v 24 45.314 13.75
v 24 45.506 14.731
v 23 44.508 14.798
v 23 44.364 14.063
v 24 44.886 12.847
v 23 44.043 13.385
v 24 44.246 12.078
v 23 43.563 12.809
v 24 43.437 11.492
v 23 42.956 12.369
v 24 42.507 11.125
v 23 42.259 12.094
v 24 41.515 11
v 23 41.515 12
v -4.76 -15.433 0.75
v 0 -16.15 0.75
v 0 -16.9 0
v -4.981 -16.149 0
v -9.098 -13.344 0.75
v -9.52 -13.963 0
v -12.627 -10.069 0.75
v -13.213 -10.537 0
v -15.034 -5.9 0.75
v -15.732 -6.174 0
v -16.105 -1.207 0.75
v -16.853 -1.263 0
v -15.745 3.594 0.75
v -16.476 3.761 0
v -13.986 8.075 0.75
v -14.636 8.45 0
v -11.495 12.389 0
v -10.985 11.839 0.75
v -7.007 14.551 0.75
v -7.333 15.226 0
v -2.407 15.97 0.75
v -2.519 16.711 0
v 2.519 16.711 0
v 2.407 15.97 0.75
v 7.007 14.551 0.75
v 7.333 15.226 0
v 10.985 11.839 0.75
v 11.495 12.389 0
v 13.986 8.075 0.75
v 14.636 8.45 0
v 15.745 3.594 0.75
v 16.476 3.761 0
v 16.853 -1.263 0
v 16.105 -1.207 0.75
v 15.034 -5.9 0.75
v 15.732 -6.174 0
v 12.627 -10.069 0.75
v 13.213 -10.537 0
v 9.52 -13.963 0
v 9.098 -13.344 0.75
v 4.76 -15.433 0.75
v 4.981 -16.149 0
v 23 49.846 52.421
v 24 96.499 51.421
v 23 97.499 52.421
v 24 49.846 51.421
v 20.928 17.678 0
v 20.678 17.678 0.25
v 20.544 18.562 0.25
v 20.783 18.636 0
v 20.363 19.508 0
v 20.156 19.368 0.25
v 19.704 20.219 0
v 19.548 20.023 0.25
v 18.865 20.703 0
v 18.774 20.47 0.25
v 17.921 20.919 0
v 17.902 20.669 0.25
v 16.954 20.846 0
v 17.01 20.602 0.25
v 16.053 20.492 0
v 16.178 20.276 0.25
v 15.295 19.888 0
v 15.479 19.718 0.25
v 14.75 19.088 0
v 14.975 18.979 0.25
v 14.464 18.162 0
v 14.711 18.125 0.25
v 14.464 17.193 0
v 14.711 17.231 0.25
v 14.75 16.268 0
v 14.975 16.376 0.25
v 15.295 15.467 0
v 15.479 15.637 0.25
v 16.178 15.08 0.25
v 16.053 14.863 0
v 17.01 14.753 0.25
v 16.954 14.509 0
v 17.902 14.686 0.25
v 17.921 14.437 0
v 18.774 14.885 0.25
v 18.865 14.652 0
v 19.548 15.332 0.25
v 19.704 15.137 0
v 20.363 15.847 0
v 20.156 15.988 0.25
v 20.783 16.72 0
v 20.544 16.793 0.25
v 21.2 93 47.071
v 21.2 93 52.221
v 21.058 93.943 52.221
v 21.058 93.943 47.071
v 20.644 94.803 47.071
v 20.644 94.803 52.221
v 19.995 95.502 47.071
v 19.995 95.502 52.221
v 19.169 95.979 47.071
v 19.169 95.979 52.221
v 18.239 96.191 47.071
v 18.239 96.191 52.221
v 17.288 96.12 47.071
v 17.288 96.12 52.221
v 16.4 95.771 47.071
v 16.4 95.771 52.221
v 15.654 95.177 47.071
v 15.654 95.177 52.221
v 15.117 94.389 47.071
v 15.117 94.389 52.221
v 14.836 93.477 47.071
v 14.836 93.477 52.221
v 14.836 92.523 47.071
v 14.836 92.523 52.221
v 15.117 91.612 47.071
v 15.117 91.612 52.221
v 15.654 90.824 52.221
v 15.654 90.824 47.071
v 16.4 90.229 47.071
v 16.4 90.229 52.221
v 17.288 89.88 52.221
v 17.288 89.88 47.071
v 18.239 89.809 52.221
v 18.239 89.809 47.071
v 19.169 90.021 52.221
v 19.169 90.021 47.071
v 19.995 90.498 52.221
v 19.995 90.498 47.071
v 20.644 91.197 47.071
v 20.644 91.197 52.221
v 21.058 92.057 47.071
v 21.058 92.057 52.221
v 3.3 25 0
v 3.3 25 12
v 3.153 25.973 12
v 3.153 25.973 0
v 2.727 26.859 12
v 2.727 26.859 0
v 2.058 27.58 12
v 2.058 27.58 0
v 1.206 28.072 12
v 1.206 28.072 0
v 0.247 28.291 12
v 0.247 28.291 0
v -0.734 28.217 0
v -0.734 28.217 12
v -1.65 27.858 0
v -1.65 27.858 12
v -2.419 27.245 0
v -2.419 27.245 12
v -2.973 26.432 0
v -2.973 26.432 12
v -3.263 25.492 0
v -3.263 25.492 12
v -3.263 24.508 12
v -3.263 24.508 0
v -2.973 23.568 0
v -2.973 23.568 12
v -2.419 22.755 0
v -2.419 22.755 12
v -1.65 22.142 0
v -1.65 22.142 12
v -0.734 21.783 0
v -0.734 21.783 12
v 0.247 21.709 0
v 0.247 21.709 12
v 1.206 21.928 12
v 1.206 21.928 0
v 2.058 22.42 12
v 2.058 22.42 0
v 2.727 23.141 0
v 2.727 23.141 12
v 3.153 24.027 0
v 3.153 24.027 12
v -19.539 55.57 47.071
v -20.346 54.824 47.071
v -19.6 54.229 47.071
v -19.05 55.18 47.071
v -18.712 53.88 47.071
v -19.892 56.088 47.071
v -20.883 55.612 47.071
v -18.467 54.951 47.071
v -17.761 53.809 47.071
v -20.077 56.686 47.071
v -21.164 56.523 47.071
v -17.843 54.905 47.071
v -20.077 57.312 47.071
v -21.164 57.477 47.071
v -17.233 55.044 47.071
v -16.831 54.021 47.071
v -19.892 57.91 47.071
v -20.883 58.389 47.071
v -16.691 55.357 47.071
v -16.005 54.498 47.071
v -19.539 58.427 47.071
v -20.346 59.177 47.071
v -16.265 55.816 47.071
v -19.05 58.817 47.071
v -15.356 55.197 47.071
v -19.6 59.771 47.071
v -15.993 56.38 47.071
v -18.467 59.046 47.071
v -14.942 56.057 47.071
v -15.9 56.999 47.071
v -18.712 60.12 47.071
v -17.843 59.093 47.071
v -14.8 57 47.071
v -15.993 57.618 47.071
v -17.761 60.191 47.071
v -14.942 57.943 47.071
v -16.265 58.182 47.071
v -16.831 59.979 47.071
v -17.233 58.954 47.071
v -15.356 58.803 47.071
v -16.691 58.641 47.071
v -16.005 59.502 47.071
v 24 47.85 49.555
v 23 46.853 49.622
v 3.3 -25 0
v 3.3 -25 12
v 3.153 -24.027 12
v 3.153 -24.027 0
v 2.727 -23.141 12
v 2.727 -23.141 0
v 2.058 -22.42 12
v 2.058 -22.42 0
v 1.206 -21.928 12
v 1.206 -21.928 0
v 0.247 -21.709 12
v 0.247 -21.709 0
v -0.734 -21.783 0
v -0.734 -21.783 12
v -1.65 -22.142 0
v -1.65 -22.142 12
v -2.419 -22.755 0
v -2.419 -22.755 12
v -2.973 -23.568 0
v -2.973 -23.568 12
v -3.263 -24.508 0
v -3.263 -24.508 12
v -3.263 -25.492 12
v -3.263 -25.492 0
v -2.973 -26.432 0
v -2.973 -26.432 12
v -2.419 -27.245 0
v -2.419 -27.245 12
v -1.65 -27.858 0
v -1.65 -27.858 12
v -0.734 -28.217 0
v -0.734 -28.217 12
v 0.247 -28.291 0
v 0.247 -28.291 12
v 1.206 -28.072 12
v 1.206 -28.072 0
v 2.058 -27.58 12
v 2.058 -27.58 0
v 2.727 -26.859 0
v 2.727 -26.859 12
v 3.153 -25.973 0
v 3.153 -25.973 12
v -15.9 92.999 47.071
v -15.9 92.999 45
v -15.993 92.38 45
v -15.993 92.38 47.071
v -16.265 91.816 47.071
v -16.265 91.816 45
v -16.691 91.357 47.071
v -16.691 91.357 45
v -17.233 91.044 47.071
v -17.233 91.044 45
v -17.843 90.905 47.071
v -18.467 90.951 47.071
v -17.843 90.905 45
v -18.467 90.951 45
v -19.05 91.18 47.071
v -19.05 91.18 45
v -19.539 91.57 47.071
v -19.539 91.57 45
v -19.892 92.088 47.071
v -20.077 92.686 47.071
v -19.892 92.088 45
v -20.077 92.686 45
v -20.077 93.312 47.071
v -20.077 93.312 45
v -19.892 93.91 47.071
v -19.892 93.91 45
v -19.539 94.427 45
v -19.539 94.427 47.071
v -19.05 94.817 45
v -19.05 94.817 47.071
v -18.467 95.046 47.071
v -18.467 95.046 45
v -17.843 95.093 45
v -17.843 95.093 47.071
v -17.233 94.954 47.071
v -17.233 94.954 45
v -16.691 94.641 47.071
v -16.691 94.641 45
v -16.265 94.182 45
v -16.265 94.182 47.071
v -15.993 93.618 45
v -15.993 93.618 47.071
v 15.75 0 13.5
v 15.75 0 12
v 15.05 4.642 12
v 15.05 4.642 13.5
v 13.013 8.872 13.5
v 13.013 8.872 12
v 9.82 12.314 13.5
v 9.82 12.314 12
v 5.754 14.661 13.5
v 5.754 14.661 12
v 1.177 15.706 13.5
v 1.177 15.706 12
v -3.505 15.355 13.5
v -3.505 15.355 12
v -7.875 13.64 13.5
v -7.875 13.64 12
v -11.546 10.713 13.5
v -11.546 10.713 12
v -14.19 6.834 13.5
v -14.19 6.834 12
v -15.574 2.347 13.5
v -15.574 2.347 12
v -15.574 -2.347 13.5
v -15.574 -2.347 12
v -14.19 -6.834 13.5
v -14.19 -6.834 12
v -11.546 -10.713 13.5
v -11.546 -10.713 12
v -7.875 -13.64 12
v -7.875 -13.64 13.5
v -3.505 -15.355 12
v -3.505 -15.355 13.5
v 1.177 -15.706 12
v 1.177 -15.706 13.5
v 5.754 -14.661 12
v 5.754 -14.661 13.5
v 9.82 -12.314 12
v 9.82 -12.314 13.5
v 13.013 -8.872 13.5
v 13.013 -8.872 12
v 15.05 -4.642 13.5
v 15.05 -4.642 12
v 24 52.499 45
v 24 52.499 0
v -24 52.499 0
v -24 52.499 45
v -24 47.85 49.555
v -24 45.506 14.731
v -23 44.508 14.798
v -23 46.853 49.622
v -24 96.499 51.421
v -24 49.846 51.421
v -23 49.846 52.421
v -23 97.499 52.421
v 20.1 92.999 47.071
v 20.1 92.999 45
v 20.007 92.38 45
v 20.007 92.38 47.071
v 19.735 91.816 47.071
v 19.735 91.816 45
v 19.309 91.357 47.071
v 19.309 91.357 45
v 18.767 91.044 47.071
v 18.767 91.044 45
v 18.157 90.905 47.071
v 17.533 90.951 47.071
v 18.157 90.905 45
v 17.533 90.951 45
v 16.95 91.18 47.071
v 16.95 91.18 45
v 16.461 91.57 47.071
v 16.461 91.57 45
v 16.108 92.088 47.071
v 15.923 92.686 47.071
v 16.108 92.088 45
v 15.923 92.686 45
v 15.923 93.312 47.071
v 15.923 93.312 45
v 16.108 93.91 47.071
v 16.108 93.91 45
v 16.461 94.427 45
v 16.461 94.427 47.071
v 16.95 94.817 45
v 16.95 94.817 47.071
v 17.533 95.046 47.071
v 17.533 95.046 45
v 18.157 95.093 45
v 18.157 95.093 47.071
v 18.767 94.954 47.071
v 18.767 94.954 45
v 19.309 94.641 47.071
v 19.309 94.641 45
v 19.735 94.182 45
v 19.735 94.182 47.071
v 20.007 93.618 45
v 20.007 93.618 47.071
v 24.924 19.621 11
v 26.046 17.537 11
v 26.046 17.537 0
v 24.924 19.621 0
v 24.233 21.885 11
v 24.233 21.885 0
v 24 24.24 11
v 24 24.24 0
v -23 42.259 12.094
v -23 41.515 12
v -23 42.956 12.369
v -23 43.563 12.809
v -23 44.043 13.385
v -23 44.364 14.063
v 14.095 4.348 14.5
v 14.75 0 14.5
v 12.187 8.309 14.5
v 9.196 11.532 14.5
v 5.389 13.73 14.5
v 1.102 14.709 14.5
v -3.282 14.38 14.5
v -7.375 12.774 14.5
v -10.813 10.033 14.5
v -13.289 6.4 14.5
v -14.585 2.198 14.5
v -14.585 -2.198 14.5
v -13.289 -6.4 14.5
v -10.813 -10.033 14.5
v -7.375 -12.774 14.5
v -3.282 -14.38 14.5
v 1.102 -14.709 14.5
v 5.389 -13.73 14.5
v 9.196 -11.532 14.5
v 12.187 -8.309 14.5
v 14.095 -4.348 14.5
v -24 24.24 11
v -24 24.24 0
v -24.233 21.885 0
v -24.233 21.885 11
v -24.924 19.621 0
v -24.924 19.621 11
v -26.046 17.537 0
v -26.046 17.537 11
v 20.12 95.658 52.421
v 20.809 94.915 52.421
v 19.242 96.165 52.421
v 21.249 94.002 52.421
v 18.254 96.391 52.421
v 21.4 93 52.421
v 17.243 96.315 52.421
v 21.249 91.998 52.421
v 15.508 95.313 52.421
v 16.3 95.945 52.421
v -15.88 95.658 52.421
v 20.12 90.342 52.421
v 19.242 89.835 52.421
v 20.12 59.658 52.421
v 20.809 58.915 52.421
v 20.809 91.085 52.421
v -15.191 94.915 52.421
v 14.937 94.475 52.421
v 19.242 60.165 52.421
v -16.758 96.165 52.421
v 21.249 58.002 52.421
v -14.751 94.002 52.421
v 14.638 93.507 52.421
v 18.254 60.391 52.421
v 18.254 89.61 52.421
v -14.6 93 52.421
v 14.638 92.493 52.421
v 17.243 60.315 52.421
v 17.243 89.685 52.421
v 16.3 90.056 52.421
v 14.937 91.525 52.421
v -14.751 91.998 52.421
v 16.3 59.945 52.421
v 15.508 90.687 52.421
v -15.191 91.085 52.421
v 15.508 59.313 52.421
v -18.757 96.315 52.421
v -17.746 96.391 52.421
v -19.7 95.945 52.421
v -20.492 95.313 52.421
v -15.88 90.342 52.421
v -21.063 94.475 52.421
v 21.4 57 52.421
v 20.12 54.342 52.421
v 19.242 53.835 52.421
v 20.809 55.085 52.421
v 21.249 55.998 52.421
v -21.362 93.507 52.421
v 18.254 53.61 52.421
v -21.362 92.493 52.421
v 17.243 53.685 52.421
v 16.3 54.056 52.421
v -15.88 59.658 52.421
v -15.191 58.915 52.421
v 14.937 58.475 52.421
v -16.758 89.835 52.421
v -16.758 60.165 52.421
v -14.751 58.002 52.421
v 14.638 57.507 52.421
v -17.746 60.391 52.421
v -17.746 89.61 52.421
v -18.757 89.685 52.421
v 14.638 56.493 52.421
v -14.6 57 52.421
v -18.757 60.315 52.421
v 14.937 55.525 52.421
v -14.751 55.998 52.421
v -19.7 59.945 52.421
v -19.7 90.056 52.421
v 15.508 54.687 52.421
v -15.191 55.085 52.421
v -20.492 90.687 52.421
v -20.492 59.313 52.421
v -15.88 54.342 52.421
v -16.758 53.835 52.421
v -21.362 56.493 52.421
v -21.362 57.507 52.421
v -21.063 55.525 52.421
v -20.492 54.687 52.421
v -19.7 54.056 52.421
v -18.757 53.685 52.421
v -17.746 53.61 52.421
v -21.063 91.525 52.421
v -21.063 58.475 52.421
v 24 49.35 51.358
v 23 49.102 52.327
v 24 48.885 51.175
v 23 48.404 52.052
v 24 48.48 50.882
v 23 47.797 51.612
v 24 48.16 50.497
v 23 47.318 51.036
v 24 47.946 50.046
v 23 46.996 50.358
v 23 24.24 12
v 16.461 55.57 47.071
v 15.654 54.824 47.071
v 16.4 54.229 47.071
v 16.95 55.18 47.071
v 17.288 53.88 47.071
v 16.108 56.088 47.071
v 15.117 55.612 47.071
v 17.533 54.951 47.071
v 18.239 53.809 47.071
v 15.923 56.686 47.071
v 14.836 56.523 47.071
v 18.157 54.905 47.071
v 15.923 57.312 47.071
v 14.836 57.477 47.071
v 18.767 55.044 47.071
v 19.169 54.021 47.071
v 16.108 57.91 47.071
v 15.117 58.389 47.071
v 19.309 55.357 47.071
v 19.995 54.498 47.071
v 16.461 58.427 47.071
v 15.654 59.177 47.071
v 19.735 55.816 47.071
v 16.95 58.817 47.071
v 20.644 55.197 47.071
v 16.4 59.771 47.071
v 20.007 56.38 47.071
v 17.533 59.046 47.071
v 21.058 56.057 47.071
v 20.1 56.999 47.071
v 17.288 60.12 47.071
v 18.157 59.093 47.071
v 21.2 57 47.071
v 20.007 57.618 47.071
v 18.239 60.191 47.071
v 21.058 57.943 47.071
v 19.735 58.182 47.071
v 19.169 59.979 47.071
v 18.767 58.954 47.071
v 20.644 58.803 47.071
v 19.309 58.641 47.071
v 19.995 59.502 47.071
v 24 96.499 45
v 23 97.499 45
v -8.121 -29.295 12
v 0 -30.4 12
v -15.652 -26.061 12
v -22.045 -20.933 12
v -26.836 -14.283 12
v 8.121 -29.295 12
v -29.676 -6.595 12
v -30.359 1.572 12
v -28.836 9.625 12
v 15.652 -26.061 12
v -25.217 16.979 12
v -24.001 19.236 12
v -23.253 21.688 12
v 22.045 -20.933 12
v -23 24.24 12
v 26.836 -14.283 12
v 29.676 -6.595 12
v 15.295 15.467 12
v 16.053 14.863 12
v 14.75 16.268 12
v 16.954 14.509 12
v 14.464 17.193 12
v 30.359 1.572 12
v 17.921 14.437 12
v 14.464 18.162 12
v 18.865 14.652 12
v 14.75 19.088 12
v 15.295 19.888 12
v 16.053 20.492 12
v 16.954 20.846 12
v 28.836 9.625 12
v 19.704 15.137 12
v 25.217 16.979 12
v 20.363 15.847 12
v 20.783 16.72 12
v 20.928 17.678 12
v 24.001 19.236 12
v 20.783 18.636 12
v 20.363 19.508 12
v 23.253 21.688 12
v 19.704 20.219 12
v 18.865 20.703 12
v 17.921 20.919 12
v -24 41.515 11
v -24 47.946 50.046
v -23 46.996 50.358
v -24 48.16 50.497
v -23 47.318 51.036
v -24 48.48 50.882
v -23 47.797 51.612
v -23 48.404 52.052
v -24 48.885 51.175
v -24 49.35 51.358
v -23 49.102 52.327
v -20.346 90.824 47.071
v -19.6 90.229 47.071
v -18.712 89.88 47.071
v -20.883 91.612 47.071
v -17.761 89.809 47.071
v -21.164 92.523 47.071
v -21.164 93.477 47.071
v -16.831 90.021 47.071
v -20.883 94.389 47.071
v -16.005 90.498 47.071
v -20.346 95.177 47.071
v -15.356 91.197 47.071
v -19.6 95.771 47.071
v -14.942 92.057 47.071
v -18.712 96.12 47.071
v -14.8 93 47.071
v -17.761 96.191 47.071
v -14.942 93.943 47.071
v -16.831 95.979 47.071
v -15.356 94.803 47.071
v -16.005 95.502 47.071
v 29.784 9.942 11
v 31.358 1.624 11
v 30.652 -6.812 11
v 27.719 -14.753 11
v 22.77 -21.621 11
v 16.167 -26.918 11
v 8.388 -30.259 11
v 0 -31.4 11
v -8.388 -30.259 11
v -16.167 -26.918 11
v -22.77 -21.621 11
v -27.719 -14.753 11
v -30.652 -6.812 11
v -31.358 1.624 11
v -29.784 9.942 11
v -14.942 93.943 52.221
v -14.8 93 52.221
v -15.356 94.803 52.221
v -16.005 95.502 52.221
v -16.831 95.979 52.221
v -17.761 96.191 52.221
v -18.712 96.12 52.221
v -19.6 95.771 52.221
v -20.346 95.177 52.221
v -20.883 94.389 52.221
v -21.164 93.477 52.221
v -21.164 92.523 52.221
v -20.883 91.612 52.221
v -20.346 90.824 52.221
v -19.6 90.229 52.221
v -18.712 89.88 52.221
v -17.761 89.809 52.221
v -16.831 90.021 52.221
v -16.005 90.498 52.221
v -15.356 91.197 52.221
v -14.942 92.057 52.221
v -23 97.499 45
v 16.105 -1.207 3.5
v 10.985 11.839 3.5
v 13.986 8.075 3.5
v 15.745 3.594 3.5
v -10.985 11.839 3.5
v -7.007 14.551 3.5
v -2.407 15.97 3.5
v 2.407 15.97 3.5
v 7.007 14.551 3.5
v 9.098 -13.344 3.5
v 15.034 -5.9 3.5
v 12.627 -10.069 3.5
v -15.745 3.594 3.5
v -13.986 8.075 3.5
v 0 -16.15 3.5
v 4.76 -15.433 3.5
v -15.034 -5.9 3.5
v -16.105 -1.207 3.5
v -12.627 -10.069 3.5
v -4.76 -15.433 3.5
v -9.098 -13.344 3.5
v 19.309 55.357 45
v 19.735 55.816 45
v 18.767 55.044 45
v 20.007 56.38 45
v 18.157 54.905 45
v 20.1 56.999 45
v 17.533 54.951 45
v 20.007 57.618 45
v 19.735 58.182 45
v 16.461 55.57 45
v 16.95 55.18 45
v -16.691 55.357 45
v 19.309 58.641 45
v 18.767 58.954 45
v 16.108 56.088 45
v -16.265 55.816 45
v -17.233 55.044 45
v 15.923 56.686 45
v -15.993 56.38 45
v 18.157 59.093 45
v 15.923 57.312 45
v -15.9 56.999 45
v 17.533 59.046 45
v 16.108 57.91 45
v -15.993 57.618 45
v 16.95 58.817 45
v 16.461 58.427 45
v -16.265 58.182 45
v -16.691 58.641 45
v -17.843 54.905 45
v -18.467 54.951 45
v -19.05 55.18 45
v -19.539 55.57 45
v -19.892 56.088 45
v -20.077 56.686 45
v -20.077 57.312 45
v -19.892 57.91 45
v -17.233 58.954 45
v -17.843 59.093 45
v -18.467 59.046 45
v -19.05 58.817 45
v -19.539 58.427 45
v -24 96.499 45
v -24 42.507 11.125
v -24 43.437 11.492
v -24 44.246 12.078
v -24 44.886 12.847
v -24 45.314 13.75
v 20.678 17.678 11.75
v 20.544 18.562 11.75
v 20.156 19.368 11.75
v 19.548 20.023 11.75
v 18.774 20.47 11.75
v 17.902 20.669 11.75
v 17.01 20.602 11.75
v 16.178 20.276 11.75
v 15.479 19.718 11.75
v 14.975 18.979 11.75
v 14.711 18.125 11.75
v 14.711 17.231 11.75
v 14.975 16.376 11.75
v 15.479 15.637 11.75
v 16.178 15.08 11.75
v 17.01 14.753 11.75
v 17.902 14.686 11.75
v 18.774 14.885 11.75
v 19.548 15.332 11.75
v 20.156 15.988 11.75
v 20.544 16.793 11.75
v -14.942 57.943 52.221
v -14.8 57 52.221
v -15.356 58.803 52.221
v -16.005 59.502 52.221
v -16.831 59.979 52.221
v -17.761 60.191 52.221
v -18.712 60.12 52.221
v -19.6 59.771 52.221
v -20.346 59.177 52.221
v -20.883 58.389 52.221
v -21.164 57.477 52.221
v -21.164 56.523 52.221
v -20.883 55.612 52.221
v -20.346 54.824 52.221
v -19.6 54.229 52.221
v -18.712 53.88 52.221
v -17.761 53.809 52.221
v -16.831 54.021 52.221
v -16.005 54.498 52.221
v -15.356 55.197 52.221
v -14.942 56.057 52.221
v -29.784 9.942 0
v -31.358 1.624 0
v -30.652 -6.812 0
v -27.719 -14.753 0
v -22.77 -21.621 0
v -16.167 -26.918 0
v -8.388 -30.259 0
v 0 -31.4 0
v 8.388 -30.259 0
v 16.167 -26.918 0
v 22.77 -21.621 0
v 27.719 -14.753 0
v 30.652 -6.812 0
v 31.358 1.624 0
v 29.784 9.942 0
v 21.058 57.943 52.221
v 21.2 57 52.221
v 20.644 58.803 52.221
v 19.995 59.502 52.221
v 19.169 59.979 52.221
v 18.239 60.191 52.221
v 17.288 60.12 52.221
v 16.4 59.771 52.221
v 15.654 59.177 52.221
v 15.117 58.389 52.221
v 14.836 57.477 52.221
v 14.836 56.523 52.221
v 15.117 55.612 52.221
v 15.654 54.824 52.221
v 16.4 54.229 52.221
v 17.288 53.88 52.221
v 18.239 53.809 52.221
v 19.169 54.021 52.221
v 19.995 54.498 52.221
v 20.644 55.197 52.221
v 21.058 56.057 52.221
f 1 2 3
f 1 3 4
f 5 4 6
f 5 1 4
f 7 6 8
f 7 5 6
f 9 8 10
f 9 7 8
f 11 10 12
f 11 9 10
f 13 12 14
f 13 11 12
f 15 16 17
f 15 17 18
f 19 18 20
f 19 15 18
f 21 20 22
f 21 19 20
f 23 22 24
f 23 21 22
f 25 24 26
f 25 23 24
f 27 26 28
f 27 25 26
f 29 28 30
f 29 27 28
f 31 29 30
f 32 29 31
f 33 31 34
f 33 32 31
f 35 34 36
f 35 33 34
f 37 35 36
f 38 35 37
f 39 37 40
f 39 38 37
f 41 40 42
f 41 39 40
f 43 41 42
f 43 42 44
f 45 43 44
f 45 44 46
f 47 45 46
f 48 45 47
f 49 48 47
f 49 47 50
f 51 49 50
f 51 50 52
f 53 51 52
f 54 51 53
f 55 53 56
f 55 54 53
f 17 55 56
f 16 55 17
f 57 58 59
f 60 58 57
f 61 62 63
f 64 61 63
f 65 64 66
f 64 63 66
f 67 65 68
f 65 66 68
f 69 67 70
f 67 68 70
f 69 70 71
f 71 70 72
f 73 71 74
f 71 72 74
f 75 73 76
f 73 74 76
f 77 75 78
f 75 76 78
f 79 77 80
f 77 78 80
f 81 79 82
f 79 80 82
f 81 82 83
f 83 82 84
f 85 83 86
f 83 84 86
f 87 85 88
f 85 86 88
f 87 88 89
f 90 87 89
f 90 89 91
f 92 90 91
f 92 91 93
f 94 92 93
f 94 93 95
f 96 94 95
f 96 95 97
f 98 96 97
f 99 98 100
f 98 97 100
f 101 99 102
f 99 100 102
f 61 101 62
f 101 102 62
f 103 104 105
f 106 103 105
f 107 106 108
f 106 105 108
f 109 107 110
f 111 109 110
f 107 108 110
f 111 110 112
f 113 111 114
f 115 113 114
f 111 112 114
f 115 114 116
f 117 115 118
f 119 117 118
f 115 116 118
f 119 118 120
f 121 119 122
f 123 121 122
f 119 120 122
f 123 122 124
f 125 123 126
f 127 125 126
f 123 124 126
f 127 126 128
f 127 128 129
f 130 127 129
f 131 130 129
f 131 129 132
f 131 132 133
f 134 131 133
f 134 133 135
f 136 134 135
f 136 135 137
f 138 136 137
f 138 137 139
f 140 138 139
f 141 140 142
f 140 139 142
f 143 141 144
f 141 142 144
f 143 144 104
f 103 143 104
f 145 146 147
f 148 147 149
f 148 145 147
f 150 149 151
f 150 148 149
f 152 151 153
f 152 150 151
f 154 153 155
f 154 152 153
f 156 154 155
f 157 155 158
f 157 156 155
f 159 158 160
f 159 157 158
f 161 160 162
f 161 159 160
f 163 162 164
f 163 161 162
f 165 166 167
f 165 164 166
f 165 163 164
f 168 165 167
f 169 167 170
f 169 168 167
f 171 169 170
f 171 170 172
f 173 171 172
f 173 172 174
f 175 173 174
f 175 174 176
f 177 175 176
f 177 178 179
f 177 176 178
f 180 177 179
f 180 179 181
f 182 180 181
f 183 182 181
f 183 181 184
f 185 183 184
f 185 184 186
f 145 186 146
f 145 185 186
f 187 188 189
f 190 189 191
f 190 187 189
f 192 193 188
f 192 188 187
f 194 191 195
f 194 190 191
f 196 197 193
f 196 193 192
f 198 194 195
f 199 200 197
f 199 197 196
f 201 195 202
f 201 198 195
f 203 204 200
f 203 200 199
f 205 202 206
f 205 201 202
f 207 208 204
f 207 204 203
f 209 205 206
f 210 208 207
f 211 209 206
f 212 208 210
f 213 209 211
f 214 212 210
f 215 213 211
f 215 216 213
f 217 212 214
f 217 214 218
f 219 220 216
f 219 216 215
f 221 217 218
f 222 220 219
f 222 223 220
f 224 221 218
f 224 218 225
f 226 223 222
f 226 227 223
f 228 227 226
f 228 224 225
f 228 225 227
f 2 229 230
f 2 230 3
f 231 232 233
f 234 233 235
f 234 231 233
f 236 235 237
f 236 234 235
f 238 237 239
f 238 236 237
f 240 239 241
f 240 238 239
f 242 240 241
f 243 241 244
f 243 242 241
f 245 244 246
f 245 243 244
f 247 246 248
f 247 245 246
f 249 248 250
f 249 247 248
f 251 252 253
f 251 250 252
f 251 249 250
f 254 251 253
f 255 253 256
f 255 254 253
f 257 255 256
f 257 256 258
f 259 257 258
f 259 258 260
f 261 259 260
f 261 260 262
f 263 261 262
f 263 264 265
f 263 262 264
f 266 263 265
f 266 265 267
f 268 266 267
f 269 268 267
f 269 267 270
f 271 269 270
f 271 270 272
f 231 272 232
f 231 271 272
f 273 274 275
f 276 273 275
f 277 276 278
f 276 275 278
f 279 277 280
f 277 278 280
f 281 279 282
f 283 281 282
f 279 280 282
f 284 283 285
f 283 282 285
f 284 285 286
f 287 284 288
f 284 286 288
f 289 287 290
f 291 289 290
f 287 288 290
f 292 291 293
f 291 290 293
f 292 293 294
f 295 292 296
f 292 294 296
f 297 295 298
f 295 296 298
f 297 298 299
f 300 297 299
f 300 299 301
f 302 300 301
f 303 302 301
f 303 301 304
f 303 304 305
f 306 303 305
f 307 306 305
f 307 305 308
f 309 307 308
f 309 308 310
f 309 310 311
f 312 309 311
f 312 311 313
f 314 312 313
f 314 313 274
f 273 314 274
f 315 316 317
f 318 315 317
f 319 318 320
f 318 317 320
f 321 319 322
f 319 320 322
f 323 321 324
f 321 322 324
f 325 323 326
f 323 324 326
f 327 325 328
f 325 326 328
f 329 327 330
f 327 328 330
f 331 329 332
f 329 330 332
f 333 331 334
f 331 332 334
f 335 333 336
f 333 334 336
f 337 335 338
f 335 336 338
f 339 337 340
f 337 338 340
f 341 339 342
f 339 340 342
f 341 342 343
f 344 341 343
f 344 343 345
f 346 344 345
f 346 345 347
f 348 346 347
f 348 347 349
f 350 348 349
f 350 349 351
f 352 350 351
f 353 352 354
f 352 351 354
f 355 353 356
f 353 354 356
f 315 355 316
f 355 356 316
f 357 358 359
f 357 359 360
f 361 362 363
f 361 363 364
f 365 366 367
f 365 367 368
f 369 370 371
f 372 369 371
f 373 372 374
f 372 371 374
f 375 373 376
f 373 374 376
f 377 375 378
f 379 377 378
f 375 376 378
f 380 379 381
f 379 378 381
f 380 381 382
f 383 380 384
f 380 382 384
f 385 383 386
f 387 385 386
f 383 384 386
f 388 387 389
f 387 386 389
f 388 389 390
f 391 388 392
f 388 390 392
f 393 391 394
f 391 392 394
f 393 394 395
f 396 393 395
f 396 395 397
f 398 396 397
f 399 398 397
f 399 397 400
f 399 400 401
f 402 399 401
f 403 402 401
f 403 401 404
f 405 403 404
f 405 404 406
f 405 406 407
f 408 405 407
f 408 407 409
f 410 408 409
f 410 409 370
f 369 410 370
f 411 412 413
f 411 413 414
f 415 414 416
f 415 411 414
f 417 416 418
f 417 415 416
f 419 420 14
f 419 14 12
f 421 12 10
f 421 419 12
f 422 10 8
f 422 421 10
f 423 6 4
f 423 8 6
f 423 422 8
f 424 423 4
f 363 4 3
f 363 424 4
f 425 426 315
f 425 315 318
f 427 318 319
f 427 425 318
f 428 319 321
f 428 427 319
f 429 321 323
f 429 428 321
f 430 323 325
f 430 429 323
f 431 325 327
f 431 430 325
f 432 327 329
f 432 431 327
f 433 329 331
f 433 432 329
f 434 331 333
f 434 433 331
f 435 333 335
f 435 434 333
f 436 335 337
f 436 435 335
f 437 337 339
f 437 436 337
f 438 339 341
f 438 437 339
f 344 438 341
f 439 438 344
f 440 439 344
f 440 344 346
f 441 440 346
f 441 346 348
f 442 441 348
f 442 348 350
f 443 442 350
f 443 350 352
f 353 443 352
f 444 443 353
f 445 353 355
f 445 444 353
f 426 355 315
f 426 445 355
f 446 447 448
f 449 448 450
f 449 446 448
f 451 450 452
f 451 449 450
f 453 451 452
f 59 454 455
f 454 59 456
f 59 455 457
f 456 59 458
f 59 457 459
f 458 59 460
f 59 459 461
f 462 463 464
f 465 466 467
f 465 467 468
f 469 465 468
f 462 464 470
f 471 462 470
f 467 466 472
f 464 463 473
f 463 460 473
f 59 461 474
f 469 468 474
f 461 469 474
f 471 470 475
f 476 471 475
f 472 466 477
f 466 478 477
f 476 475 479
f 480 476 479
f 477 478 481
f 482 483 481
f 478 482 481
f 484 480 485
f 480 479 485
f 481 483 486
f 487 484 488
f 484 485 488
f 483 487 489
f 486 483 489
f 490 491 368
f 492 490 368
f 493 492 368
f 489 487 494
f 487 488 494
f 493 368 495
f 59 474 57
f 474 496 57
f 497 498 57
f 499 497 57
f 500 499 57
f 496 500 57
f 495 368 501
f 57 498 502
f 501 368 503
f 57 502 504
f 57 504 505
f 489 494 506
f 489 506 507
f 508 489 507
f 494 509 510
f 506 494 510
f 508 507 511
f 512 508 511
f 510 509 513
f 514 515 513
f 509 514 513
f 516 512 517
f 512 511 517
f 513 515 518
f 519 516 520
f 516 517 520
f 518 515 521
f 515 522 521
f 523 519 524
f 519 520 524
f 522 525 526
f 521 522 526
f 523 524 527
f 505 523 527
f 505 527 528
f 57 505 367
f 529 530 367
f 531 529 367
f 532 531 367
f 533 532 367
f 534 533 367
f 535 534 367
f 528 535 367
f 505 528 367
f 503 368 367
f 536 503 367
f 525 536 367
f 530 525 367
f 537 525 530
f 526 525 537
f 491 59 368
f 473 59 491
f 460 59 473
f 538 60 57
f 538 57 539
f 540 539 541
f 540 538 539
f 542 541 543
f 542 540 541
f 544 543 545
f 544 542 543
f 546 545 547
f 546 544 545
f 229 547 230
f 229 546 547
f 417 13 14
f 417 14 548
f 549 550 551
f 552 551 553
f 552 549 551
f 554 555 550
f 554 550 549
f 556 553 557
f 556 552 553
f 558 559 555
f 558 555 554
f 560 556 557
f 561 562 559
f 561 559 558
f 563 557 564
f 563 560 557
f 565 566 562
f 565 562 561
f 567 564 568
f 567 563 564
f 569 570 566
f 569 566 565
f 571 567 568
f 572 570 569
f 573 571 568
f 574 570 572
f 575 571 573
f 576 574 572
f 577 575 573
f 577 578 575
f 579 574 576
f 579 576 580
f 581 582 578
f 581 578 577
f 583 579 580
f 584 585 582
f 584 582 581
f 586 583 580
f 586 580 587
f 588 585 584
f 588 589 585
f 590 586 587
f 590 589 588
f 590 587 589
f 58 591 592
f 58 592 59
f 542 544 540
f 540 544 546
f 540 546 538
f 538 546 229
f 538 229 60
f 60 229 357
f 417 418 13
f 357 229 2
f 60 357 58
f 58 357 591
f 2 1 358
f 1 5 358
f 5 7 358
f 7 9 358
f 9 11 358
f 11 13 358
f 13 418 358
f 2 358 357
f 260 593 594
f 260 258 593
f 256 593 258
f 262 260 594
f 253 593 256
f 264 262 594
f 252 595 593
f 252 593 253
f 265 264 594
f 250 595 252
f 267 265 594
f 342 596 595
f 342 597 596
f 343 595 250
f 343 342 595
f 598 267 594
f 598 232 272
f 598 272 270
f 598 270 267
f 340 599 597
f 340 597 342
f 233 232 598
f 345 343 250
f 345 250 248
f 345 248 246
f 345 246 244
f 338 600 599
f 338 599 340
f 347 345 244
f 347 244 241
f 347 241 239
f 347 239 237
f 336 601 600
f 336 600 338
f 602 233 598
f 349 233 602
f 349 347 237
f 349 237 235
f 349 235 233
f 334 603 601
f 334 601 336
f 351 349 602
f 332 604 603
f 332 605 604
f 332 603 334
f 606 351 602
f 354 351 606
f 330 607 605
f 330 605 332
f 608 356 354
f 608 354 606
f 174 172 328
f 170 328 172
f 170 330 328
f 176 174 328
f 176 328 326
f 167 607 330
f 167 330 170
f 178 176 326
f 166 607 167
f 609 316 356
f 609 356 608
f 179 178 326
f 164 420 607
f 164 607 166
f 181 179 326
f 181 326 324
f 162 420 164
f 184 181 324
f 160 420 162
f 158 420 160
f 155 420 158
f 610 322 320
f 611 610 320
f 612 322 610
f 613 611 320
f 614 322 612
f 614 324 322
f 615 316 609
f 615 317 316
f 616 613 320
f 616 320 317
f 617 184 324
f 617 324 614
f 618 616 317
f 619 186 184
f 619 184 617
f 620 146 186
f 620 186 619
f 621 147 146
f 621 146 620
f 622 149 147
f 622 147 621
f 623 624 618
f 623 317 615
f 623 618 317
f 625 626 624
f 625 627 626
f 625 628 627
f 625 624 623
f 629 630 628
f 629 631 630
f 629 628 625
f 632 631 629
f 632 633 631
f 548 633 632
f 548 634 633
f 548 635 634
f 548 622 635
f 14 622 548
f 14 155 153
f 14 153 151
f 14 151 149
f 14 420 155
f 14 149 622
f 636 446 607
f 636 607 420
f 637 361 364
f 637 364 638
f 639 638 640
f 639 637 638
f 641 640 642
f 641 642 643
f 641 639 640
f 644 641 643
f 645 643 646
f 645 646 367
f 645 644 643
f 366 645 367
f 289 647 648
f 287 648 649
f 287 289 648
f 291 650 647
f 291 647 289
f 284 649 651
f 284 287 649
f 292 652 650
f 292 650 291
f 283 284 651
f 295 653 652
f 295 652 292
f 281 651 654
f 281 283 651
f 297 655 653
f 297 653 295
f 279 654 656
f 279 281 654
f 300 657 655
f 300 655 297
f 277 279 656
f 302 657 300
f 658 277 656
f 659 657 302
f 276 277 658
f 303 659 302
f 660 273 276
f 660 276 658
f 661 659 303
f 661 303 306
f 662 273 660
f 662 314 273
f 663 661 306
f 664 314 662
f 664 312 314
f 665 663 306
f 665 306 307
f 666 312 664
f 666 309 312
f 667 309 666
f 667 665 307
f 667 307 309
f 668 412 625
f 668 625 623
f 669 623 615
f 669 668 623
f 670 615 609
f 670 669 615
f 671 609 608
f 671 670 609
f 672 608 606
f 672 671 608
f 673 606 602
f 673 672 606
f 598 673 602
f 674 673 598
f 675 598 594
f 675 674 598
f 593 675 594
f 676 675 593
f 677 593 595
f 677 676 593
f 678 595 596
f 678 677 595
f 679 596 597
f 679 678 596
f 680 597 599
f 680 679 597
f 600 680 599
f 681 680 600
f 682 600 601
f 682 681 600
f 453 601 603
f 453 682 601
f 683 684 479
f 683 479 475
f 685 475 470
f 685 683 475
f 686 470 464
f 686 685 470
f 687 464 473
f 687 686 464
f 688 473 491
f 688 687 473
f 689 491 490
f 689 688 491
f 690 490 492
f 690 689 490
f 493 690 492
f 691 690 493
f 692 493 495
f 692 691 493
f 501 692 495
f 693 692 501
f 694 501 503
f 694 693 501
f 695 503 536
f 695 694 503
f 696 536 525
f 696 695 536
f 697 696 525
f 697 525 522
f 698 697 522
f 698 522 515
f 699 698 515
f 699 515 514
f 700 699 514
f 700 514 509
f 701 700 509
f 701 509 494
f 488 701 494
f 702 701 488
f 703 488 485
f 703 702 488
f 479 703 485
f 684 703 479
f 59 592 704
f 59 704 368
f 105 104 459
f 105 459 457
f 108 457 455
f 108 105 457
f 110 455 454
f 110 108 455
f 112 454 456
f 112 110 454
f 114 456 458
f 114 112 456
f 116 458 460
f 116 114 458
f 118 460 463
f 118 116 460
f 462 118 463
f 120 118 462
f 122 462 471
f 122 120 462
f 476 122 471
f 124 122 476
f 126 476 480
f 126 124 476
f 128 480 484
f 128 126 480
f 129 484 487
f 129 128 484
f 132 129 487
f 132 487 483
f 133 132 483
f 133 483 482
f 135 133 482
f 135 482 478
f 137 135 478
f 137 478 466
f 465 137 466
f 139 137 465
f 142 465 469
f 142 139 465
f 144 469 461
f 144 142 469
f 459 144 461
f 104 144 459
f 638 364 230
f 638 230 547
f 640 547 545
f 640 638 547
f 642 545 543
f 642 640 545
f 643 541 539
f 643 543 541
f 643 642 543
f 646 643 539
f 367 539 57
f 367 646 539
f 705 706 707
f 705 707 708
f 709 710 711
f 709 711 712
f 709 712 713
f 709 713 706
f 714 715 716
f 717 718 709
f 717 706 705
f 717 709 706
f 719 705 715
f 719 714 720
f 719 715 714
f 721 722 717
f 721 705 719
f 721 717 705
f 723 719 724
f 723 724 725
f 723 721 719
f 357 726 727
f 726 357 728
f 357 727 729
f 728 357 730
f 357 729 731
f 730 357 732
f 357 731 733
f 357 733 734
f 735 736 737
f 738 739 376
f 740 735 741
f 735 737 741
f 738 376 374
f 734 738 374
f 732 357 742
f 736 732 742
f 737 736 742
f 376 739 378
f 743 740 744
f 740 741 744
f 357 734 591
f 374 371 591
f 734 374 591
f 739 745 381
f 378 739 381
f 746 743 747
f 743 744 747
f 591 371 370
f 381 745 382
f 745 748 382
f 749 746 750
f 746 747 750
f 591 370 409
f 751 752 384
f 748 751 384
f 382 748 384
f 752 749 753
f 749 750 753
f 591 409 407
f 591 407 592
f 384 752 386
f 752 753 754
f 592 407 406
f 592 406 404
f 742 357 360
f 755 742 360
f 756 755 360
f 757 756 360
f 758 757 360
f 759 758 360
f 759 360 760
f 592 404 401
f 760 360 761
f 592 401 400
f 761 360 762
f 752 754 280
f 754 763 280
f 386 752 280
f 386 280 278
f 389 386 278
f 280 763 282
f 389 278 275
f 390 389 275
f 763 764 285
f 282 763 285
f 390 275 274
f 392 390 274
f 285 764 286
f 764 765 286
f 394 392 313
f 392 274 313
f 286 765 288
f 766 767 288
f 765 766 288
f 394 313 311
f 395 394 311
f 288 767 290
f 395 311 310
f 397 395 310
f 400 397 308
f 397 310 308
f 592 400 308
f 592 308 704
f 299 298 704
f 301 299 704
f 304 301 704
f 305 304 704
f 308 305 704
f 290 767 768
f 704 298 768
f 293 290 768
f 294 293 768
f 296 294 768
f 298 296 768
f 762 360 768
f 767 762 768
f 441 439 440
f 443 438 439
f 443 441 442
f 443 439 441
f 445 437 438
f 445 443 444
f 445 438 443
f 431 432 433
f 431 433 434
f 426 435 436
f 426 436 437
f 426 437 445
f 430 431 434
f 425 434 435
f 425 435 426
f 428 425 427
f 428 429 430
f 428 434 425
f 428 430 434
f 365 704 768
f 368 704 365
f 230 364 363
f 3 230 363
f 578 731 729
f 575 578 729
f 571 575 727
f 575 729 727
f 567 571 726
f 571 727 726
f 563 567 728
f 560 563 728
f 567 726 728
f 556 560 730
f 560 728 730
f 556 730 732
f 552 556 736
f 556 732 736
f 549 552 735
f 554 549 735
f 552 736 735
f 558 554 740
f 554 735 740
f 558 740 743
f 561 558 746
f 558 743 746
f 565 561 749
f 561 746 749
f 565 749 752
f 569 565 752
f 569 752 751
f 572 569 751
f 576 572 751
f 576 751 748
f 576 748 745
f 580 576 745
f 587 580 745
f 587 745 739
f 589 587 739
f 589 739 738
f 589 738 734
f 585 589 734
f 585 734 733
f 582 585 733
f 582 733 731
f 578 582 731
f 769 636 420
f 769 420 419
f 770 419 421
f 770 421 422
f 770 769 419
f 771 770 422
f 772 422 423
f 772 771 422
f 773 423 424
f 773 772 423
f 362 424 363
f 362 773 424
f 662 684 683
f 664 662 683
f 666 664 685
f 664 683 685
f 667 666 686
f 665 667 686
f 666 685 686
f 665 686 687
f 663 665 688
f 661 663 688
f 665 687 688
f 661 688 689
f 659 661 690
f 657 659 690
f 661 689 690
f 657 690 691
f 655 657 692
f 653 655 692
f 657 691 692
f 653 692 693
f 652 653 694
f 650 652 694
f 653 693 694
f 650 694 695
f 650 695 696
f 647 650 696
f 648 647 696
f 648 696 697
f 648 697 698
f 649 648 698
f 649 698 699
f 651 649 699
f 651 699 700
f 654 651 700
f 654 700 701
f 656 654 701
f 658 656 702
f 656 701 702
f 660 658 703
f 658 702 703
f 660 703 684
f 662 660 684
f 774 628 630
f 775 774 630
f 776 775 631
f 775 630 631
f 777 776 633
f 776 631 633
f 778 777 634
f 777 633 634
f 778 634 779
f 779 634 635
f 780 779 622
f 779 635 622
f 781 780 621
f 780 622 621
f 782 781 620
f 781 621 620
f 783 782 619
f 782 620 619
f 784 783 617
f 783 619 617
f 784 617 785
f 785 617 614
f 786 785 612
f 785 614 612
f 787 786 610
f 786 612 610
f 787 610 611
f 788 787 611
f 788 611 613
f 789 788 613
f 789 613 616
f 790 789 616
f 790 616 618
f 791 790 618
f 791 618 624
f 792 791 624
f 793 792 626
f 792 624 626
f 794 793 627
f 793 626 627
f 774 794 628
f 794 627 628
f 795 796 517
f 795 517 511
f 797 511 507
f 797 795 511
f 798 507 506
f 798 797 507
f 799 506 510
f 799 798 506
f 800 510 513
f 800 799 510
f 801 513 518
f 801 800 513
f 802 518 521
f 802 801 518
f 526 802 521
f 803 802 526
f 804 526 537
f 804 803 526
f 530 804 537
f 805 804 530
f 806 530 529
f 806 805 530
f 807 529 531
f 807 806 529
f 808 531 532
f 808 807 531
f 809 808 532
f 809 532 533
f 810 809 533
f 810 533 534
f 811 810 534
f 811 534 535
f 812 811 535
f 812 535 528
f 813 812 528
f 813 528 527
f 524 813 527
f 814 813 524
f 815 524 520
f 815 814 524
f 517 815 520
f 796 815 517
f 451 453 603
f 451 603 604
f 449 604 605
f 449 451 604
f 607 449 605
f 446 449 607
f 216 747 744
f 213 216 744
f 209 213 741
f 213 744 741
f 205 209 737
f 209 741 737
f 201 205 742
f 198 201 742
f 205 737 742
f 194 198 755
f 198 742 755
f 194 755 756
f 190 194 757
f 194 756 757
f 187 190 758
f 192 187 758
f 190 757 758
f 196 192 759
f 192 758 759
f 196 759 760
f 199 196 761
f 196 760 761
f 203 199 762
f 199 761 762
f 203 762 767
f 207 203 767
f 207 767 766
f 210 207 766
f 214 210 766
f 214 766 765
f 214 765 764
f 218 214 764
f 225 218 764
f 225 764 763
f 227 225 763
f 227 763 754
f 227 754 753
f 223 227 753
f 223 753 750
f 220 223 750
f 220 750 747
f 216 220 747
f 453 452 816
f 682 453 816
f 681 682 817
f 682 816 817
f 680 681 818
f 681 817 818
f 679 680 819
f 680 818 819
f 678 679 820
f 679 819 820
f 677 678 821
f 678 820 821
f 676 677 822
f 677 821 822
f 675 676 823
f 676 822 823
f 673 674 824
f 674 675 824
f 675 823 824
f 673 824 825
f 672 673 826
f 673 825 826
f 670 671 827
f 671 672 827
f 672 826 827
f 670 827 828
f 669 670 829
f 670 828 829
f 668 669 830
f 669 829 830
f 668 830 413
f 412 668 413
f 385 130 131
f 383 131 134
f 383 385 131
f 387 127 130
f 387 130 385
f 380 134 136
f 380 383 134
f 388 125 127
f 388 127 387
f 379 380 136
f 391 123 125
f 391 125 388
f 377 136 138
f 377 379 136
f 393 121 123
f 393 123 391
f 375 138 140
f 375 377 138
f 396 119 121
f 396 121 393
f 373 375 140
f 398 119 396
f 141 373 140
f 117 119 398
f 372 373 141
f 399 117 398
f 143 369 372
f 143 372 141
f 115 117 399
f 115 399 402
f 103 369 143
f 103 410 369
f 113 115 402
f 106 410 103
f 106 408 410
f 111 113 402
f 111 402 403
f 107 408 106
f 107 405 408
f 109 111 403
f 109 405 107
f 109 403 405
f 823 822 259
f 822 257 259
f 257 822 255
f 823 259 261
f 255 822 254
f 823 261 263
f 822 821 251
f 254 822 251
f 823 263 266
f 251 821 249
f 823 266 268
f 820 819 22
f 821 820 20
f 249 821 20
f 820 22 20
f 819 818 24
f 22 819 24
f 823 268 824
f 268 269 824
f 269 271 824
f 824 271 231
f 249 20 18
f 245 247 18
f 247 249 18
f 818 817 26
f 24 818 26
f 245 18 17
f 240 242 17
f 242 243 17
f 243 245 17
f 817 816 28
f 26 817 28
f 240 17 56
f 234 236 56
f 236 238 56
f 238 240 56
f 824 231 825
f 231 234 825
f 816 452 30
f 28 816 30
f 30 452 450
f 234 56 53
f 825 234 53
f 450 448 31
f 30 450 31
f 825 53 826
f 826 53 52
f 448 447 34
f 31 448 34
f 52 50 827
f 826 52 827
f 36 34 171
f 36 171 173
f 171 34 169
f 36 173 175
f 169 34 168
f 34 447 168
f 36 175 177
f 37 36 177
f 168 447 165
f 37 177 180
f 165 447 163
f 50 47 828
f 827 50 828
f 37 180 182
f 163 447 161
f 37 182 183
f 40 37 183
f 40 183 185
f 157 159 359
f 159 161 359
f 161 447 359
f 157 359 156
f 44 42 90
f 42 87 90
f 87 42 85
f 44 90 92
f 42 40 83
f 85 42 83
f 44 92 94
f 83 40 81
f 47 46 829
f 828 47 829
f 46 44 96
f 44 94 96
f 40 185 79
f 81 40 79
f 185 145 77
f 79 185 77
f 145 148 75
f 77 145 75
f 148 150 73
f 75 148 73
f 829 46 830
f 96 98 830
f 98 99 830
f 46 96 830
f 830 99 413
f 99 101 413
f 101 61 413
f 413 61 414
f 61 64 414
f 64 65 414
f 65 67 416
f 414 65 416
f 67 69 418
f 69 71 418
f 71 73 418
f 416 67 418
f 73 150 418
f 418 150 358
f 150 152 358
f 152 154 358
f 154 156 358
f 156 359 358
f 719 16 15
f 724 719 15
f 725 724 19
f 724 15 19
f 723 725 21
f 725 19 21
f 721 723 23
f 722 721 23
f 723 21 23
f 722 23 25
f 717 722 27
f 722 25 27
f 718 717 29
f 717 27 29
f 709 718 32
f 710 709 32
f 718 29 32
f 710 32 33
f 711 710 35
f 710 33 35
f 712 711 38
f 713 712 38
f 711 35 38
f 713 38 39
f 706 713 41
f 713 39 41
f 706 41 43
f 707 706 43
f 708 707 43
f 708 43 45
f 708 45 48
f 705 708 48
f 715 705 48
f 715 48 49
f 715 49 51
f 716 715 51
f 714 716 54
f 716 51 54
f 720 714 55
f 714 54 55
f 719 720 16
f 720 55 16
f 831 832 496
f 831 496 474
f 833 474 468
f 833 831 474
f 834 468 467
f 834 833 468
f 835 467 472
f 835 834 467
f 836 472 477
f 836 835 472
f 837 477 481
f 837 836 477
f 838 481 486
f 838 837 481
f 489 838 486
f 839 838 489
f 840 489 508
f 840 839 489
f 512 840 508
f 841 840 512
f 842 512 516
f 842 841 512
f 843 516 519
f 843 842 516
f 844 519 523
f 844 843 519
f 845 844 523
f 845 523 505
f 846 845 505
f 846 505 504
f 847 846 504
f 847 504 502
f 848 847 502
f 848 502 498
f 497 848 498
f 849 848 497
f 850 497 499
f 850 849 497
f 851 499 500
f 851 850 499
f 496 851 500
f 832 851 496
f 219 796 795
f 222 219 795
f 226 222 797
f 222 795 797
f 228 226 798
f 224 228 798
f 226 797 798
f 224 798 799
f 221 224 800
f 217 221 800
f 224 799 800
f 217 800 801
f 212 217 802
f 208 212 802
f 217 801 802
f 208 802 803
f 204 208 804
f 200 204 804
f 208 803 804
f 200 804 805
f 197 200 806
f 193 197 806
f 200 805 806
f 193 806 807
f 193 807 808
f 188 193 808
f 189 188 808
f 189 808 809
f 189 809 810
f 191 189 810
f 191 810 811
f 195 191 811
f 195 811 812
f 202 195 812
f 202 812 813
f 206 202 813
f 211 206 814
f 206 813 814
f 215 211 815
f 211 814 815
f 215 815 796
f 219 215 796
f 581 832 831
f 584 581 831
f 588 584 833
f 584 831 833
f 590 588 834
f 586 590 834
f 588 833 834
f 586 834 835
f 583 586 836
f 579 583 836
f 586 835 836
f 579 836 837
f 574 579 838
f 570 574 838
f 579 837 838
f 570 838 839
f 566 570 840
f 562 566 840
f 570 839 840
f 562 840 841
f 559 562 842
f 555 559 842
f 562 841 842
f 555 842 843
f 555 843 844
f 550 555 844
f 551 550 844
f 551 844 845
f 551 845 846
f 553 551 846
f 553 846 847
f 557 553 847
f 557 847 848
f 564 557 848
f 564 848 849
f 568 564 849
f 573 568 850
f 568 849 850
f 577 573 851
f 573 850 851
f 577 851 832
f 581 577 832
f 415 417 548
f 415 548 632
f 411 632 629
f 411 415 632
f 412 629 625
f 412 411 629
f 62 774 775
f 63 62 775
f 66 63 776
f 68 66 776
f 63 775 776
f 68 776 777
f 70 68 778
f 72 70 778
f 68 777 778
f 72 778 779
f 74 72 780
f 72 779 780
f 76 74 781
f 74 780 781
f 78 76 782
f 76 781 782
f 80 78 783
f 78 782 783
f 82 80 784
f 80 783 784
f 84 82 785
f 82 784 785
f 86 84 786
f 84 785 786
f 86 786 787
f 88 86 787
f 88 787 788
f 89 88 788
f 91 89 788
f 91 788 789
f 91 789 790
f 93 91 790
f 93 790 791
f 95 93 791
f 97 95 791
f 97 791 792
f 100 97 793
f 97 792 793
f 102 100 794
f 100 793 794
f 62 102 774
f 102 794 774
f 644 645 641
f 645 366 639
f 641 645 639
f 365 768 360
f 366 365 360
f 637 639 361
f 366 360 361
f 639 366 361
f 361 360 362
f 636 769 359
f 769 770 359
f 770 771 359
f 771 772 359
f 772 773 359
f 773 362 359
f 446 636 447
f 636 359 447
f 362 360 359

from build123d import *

# Parameters (mm, degrees)
SKETCH_R          = 31.4
PAD_DEPTH         = 12
SKETCH001_R       = 16.15
PAD001_DEPTH      = 2.5
SKETCH009_R       = 15.75
PAD004_DEPTH      = 2.5
PAD001_FACE4_R    = 16.15
POCKET_DEPTH      = 3.5
SKETCH002_R       = 3.3
POCKET001_DEPTH   = 20
CHAMFER_SIZE      = 1
CHAMFER001_SIZE   = 0.75
SKETCH003_R       = 3
POCKET002_DEPTH   = 12
CHAMFER003_SIZE   = 0.25
PAD005_DEPTH      = 12
PAD006_DEPTH      = 24
PAD006_DEPTH_BACK = 24
SKETCH012_R       = 2.1
POCKET003_DEPTH   = 9.420822
SKETCH013_R       = 3.2
POCKET004_DEPTH   = 5.35
FILLET_R          = 12
FILLET001_R       = 3
CHAMFER004_SIZE   = 1
CHAMFER005_SIZE   = 1
CHAMFER006_SIZE   = 0.2


with BuildPart() as part:
    # Sketch → Pad (new body)
    with BuildSketch(Plane.XY):
        Circle(SKETCH_R)
    extrude(amount=PAD_DEPTH)

    # Sketch001 (on Sketch) → Pad001 (join)
    with BuildSketch(Plane.XY):
        Circle(SKETCH001_R)
    extrude(amount=PAD001_DEPTH)

    # Sketch009 (on Face3 of Pad001) → Pad004 (join)
    with BuildSketch(Plane.XY.offset(12)):
        Circle(SKETCH009_R)
    extrude(amount=PAD004_DEPTH)

    # Pad001 Face4 → Pocket (cut)
    with BuildSketch(Plane(origin=(0, 0, 0), x_dir=(0, -1, 0), z_dir=(0, 0, -1))):
        Circle(PAD001_FACE4_R)
    extrude(amount=-POCKET_DEPTH, mode=Mode.SUBTRACT)

    # Sketch002 → Pocket001 (cut)
    with BuildSketch(Plane.XY):
        with Locations((0, 25)):
            Circle(SKETCH002_R)
        with Locations((0, -25)):
            Circle(SKETCH002_R)
    extrude(amount=POCKET001_DEPTH, mode=Mode.SUBTRACT)

    # Chamfer
    chamfer_edges = [part.edges().sort_by_distance(p)[0] for p in [
        (-15.75, 0, 14.5),
    ]]
    chamfer(chamfer_edges, length=CHAMFER_SIZE)

    # Chamfer001
    chamfer001_edges = [part.edges().sort_by_distance(p)[0] for p in [
        (-16.15, 0, 0),
    ]]
    chamfer(chamfer001_edges, length=CHAMFER001_SIZE)

    # Sketch003 (on Face7 of Chamfer001) → Pocket002 (cut)
    with BuildSketch(Plane.XY.offset(12)):
        with Locations((17.67767, 17.67767)):
            Circle(SKETCH003_R)
    extrude(amount=-POCKET002_DEPTH, mode=Mode.SUBTRACT)

    # Chamfer003
    chamfer003_edges = [part.edges().sort_by_distance(p)[0] for p in [
        (14.67767, 17.67767, 12),
        (14.67767, 17.67767, 0),
    ]]
    chamfer(chamfer003_edges, length=CHAMFER003_SIZE)

    # Sketch011 → Pad005 (join)
    with BuildSketch(Plane.XY):
        with BuildLine():
            Line((24, 20.247469), (24, 34.174057))
            Line((24, 34.174057), (-24, 34.174057))
            Line((-24, 34.174057), (-24, 20.247469))
            ThreePointArc((24, 20.247469), (0, 31.4), (-24, 20.247469))
        make_face()
    extrude(amount=PAD005_DEPTH)

    # Sketch010 → Pad006 (join, two sides)
    with BuildSketch(Plane.YZ) as pad006_sk:
        Polygon((34.020989, 0), (52.498643, 0), (52.498643, 45), (97.498643, 45), (97.498643, 52.420822), (47.04097, 52.420822), (44.319458, 12), (34.020989, 12), align=None)
    extrude(amount=PAD006_DEPTH)
    extrude(pad006_sk.sketch, amount=-PAD006_DEPTH_BACK)

    # Sketch012 (on Face31 of Pad006) → Pocket003 (cut)
    with BuildSketch(Plane(origin=(0, 0, 45), x_dir=(1, 0, 0), z_dir=(0, 0, -1))):
        with Locations((18, -92.99873)):
            Circle(SKETCH012_R)
        with Locations((-18, -92.99873)):
            Circle(SKETCH012_R)
        with Locations((-18, -56.99873)):
            Circle(SKETCH012_R)
        with Locations((18, -56.99873)):
            Circle(SKETCH012_R)
    extrude(amount=-POCKET003_DEPTH, mode=Mode.SUBTRACT)

    # Sketch013 (on Face29 of Pocket003) → Pocket004 (cut)
    with BuildSketch(Plane.XY.offset(52.420822)):
        with Locations((18, 93.000084)):
            Circle(SKETCH013_R)
        with Locations((-18, 93.000084)):
            Circle(SKETCH013_R)
        with Locations((-18, 57.000084)):
            Circle(SKETCH013_R)
        with Locations((18, 57.000084)):
            Circle(SKETCH013_R)
    extrude(amount=-POCKET004_DEPTH, mode=Mode.SUBTRACT)

    # Fillet
    fillet_edges = [part.edges().sort_by_distance(p)[0] for p in [
        (-24, 20.247469, 6),
        (24, 20.247469, 6),
    ]]
    fillet(fillet_edges, radius=FILLET_R)

    # Fillet001
    fillet001_edges = [part.edges().sort_by_distance(p)[0] for p in [
        (0, 44.319458, 12),
        (0, 47.04097, 52.420822),
    ]]
    fillet(fillet001_edges, radius=FILLET001_R)

    # Chamfer004
    chamfer004_edges = [part.edges().sort_by_distance(p)[0] for p in [
        (24, 29.130313, 12),
        (-24, 29.130313, 12),
    ]]
    chamfer(chamfer004_edges, length=CHAMFER004_SIZE)

    # Chamfer005
    chamfer005_edges = [part.edges().sort_by_distance(p)[0] for p in [
        (24, 97.498643, 48.210411),
        (-24, 97.498643, 48.210411),
    ]]
    chamfer(chamfer005_edges, length=CHAMFER005_SIZE)

    # Chamfer006
    chamfer006_edges = [part.edges().sort_by_distance(p)[0] for p in [
        (-21.2, 57.000084, 52.420822),
        (-21.2, 93.000084, 52.420822),
        (14.8, 93.000084, 52.420822),
        (14.8, 57.000084, 52.420822),
    ]]
    chamfer(chamfer006_edges, length=CHAMFER006_SIZE)


solid = part.part
